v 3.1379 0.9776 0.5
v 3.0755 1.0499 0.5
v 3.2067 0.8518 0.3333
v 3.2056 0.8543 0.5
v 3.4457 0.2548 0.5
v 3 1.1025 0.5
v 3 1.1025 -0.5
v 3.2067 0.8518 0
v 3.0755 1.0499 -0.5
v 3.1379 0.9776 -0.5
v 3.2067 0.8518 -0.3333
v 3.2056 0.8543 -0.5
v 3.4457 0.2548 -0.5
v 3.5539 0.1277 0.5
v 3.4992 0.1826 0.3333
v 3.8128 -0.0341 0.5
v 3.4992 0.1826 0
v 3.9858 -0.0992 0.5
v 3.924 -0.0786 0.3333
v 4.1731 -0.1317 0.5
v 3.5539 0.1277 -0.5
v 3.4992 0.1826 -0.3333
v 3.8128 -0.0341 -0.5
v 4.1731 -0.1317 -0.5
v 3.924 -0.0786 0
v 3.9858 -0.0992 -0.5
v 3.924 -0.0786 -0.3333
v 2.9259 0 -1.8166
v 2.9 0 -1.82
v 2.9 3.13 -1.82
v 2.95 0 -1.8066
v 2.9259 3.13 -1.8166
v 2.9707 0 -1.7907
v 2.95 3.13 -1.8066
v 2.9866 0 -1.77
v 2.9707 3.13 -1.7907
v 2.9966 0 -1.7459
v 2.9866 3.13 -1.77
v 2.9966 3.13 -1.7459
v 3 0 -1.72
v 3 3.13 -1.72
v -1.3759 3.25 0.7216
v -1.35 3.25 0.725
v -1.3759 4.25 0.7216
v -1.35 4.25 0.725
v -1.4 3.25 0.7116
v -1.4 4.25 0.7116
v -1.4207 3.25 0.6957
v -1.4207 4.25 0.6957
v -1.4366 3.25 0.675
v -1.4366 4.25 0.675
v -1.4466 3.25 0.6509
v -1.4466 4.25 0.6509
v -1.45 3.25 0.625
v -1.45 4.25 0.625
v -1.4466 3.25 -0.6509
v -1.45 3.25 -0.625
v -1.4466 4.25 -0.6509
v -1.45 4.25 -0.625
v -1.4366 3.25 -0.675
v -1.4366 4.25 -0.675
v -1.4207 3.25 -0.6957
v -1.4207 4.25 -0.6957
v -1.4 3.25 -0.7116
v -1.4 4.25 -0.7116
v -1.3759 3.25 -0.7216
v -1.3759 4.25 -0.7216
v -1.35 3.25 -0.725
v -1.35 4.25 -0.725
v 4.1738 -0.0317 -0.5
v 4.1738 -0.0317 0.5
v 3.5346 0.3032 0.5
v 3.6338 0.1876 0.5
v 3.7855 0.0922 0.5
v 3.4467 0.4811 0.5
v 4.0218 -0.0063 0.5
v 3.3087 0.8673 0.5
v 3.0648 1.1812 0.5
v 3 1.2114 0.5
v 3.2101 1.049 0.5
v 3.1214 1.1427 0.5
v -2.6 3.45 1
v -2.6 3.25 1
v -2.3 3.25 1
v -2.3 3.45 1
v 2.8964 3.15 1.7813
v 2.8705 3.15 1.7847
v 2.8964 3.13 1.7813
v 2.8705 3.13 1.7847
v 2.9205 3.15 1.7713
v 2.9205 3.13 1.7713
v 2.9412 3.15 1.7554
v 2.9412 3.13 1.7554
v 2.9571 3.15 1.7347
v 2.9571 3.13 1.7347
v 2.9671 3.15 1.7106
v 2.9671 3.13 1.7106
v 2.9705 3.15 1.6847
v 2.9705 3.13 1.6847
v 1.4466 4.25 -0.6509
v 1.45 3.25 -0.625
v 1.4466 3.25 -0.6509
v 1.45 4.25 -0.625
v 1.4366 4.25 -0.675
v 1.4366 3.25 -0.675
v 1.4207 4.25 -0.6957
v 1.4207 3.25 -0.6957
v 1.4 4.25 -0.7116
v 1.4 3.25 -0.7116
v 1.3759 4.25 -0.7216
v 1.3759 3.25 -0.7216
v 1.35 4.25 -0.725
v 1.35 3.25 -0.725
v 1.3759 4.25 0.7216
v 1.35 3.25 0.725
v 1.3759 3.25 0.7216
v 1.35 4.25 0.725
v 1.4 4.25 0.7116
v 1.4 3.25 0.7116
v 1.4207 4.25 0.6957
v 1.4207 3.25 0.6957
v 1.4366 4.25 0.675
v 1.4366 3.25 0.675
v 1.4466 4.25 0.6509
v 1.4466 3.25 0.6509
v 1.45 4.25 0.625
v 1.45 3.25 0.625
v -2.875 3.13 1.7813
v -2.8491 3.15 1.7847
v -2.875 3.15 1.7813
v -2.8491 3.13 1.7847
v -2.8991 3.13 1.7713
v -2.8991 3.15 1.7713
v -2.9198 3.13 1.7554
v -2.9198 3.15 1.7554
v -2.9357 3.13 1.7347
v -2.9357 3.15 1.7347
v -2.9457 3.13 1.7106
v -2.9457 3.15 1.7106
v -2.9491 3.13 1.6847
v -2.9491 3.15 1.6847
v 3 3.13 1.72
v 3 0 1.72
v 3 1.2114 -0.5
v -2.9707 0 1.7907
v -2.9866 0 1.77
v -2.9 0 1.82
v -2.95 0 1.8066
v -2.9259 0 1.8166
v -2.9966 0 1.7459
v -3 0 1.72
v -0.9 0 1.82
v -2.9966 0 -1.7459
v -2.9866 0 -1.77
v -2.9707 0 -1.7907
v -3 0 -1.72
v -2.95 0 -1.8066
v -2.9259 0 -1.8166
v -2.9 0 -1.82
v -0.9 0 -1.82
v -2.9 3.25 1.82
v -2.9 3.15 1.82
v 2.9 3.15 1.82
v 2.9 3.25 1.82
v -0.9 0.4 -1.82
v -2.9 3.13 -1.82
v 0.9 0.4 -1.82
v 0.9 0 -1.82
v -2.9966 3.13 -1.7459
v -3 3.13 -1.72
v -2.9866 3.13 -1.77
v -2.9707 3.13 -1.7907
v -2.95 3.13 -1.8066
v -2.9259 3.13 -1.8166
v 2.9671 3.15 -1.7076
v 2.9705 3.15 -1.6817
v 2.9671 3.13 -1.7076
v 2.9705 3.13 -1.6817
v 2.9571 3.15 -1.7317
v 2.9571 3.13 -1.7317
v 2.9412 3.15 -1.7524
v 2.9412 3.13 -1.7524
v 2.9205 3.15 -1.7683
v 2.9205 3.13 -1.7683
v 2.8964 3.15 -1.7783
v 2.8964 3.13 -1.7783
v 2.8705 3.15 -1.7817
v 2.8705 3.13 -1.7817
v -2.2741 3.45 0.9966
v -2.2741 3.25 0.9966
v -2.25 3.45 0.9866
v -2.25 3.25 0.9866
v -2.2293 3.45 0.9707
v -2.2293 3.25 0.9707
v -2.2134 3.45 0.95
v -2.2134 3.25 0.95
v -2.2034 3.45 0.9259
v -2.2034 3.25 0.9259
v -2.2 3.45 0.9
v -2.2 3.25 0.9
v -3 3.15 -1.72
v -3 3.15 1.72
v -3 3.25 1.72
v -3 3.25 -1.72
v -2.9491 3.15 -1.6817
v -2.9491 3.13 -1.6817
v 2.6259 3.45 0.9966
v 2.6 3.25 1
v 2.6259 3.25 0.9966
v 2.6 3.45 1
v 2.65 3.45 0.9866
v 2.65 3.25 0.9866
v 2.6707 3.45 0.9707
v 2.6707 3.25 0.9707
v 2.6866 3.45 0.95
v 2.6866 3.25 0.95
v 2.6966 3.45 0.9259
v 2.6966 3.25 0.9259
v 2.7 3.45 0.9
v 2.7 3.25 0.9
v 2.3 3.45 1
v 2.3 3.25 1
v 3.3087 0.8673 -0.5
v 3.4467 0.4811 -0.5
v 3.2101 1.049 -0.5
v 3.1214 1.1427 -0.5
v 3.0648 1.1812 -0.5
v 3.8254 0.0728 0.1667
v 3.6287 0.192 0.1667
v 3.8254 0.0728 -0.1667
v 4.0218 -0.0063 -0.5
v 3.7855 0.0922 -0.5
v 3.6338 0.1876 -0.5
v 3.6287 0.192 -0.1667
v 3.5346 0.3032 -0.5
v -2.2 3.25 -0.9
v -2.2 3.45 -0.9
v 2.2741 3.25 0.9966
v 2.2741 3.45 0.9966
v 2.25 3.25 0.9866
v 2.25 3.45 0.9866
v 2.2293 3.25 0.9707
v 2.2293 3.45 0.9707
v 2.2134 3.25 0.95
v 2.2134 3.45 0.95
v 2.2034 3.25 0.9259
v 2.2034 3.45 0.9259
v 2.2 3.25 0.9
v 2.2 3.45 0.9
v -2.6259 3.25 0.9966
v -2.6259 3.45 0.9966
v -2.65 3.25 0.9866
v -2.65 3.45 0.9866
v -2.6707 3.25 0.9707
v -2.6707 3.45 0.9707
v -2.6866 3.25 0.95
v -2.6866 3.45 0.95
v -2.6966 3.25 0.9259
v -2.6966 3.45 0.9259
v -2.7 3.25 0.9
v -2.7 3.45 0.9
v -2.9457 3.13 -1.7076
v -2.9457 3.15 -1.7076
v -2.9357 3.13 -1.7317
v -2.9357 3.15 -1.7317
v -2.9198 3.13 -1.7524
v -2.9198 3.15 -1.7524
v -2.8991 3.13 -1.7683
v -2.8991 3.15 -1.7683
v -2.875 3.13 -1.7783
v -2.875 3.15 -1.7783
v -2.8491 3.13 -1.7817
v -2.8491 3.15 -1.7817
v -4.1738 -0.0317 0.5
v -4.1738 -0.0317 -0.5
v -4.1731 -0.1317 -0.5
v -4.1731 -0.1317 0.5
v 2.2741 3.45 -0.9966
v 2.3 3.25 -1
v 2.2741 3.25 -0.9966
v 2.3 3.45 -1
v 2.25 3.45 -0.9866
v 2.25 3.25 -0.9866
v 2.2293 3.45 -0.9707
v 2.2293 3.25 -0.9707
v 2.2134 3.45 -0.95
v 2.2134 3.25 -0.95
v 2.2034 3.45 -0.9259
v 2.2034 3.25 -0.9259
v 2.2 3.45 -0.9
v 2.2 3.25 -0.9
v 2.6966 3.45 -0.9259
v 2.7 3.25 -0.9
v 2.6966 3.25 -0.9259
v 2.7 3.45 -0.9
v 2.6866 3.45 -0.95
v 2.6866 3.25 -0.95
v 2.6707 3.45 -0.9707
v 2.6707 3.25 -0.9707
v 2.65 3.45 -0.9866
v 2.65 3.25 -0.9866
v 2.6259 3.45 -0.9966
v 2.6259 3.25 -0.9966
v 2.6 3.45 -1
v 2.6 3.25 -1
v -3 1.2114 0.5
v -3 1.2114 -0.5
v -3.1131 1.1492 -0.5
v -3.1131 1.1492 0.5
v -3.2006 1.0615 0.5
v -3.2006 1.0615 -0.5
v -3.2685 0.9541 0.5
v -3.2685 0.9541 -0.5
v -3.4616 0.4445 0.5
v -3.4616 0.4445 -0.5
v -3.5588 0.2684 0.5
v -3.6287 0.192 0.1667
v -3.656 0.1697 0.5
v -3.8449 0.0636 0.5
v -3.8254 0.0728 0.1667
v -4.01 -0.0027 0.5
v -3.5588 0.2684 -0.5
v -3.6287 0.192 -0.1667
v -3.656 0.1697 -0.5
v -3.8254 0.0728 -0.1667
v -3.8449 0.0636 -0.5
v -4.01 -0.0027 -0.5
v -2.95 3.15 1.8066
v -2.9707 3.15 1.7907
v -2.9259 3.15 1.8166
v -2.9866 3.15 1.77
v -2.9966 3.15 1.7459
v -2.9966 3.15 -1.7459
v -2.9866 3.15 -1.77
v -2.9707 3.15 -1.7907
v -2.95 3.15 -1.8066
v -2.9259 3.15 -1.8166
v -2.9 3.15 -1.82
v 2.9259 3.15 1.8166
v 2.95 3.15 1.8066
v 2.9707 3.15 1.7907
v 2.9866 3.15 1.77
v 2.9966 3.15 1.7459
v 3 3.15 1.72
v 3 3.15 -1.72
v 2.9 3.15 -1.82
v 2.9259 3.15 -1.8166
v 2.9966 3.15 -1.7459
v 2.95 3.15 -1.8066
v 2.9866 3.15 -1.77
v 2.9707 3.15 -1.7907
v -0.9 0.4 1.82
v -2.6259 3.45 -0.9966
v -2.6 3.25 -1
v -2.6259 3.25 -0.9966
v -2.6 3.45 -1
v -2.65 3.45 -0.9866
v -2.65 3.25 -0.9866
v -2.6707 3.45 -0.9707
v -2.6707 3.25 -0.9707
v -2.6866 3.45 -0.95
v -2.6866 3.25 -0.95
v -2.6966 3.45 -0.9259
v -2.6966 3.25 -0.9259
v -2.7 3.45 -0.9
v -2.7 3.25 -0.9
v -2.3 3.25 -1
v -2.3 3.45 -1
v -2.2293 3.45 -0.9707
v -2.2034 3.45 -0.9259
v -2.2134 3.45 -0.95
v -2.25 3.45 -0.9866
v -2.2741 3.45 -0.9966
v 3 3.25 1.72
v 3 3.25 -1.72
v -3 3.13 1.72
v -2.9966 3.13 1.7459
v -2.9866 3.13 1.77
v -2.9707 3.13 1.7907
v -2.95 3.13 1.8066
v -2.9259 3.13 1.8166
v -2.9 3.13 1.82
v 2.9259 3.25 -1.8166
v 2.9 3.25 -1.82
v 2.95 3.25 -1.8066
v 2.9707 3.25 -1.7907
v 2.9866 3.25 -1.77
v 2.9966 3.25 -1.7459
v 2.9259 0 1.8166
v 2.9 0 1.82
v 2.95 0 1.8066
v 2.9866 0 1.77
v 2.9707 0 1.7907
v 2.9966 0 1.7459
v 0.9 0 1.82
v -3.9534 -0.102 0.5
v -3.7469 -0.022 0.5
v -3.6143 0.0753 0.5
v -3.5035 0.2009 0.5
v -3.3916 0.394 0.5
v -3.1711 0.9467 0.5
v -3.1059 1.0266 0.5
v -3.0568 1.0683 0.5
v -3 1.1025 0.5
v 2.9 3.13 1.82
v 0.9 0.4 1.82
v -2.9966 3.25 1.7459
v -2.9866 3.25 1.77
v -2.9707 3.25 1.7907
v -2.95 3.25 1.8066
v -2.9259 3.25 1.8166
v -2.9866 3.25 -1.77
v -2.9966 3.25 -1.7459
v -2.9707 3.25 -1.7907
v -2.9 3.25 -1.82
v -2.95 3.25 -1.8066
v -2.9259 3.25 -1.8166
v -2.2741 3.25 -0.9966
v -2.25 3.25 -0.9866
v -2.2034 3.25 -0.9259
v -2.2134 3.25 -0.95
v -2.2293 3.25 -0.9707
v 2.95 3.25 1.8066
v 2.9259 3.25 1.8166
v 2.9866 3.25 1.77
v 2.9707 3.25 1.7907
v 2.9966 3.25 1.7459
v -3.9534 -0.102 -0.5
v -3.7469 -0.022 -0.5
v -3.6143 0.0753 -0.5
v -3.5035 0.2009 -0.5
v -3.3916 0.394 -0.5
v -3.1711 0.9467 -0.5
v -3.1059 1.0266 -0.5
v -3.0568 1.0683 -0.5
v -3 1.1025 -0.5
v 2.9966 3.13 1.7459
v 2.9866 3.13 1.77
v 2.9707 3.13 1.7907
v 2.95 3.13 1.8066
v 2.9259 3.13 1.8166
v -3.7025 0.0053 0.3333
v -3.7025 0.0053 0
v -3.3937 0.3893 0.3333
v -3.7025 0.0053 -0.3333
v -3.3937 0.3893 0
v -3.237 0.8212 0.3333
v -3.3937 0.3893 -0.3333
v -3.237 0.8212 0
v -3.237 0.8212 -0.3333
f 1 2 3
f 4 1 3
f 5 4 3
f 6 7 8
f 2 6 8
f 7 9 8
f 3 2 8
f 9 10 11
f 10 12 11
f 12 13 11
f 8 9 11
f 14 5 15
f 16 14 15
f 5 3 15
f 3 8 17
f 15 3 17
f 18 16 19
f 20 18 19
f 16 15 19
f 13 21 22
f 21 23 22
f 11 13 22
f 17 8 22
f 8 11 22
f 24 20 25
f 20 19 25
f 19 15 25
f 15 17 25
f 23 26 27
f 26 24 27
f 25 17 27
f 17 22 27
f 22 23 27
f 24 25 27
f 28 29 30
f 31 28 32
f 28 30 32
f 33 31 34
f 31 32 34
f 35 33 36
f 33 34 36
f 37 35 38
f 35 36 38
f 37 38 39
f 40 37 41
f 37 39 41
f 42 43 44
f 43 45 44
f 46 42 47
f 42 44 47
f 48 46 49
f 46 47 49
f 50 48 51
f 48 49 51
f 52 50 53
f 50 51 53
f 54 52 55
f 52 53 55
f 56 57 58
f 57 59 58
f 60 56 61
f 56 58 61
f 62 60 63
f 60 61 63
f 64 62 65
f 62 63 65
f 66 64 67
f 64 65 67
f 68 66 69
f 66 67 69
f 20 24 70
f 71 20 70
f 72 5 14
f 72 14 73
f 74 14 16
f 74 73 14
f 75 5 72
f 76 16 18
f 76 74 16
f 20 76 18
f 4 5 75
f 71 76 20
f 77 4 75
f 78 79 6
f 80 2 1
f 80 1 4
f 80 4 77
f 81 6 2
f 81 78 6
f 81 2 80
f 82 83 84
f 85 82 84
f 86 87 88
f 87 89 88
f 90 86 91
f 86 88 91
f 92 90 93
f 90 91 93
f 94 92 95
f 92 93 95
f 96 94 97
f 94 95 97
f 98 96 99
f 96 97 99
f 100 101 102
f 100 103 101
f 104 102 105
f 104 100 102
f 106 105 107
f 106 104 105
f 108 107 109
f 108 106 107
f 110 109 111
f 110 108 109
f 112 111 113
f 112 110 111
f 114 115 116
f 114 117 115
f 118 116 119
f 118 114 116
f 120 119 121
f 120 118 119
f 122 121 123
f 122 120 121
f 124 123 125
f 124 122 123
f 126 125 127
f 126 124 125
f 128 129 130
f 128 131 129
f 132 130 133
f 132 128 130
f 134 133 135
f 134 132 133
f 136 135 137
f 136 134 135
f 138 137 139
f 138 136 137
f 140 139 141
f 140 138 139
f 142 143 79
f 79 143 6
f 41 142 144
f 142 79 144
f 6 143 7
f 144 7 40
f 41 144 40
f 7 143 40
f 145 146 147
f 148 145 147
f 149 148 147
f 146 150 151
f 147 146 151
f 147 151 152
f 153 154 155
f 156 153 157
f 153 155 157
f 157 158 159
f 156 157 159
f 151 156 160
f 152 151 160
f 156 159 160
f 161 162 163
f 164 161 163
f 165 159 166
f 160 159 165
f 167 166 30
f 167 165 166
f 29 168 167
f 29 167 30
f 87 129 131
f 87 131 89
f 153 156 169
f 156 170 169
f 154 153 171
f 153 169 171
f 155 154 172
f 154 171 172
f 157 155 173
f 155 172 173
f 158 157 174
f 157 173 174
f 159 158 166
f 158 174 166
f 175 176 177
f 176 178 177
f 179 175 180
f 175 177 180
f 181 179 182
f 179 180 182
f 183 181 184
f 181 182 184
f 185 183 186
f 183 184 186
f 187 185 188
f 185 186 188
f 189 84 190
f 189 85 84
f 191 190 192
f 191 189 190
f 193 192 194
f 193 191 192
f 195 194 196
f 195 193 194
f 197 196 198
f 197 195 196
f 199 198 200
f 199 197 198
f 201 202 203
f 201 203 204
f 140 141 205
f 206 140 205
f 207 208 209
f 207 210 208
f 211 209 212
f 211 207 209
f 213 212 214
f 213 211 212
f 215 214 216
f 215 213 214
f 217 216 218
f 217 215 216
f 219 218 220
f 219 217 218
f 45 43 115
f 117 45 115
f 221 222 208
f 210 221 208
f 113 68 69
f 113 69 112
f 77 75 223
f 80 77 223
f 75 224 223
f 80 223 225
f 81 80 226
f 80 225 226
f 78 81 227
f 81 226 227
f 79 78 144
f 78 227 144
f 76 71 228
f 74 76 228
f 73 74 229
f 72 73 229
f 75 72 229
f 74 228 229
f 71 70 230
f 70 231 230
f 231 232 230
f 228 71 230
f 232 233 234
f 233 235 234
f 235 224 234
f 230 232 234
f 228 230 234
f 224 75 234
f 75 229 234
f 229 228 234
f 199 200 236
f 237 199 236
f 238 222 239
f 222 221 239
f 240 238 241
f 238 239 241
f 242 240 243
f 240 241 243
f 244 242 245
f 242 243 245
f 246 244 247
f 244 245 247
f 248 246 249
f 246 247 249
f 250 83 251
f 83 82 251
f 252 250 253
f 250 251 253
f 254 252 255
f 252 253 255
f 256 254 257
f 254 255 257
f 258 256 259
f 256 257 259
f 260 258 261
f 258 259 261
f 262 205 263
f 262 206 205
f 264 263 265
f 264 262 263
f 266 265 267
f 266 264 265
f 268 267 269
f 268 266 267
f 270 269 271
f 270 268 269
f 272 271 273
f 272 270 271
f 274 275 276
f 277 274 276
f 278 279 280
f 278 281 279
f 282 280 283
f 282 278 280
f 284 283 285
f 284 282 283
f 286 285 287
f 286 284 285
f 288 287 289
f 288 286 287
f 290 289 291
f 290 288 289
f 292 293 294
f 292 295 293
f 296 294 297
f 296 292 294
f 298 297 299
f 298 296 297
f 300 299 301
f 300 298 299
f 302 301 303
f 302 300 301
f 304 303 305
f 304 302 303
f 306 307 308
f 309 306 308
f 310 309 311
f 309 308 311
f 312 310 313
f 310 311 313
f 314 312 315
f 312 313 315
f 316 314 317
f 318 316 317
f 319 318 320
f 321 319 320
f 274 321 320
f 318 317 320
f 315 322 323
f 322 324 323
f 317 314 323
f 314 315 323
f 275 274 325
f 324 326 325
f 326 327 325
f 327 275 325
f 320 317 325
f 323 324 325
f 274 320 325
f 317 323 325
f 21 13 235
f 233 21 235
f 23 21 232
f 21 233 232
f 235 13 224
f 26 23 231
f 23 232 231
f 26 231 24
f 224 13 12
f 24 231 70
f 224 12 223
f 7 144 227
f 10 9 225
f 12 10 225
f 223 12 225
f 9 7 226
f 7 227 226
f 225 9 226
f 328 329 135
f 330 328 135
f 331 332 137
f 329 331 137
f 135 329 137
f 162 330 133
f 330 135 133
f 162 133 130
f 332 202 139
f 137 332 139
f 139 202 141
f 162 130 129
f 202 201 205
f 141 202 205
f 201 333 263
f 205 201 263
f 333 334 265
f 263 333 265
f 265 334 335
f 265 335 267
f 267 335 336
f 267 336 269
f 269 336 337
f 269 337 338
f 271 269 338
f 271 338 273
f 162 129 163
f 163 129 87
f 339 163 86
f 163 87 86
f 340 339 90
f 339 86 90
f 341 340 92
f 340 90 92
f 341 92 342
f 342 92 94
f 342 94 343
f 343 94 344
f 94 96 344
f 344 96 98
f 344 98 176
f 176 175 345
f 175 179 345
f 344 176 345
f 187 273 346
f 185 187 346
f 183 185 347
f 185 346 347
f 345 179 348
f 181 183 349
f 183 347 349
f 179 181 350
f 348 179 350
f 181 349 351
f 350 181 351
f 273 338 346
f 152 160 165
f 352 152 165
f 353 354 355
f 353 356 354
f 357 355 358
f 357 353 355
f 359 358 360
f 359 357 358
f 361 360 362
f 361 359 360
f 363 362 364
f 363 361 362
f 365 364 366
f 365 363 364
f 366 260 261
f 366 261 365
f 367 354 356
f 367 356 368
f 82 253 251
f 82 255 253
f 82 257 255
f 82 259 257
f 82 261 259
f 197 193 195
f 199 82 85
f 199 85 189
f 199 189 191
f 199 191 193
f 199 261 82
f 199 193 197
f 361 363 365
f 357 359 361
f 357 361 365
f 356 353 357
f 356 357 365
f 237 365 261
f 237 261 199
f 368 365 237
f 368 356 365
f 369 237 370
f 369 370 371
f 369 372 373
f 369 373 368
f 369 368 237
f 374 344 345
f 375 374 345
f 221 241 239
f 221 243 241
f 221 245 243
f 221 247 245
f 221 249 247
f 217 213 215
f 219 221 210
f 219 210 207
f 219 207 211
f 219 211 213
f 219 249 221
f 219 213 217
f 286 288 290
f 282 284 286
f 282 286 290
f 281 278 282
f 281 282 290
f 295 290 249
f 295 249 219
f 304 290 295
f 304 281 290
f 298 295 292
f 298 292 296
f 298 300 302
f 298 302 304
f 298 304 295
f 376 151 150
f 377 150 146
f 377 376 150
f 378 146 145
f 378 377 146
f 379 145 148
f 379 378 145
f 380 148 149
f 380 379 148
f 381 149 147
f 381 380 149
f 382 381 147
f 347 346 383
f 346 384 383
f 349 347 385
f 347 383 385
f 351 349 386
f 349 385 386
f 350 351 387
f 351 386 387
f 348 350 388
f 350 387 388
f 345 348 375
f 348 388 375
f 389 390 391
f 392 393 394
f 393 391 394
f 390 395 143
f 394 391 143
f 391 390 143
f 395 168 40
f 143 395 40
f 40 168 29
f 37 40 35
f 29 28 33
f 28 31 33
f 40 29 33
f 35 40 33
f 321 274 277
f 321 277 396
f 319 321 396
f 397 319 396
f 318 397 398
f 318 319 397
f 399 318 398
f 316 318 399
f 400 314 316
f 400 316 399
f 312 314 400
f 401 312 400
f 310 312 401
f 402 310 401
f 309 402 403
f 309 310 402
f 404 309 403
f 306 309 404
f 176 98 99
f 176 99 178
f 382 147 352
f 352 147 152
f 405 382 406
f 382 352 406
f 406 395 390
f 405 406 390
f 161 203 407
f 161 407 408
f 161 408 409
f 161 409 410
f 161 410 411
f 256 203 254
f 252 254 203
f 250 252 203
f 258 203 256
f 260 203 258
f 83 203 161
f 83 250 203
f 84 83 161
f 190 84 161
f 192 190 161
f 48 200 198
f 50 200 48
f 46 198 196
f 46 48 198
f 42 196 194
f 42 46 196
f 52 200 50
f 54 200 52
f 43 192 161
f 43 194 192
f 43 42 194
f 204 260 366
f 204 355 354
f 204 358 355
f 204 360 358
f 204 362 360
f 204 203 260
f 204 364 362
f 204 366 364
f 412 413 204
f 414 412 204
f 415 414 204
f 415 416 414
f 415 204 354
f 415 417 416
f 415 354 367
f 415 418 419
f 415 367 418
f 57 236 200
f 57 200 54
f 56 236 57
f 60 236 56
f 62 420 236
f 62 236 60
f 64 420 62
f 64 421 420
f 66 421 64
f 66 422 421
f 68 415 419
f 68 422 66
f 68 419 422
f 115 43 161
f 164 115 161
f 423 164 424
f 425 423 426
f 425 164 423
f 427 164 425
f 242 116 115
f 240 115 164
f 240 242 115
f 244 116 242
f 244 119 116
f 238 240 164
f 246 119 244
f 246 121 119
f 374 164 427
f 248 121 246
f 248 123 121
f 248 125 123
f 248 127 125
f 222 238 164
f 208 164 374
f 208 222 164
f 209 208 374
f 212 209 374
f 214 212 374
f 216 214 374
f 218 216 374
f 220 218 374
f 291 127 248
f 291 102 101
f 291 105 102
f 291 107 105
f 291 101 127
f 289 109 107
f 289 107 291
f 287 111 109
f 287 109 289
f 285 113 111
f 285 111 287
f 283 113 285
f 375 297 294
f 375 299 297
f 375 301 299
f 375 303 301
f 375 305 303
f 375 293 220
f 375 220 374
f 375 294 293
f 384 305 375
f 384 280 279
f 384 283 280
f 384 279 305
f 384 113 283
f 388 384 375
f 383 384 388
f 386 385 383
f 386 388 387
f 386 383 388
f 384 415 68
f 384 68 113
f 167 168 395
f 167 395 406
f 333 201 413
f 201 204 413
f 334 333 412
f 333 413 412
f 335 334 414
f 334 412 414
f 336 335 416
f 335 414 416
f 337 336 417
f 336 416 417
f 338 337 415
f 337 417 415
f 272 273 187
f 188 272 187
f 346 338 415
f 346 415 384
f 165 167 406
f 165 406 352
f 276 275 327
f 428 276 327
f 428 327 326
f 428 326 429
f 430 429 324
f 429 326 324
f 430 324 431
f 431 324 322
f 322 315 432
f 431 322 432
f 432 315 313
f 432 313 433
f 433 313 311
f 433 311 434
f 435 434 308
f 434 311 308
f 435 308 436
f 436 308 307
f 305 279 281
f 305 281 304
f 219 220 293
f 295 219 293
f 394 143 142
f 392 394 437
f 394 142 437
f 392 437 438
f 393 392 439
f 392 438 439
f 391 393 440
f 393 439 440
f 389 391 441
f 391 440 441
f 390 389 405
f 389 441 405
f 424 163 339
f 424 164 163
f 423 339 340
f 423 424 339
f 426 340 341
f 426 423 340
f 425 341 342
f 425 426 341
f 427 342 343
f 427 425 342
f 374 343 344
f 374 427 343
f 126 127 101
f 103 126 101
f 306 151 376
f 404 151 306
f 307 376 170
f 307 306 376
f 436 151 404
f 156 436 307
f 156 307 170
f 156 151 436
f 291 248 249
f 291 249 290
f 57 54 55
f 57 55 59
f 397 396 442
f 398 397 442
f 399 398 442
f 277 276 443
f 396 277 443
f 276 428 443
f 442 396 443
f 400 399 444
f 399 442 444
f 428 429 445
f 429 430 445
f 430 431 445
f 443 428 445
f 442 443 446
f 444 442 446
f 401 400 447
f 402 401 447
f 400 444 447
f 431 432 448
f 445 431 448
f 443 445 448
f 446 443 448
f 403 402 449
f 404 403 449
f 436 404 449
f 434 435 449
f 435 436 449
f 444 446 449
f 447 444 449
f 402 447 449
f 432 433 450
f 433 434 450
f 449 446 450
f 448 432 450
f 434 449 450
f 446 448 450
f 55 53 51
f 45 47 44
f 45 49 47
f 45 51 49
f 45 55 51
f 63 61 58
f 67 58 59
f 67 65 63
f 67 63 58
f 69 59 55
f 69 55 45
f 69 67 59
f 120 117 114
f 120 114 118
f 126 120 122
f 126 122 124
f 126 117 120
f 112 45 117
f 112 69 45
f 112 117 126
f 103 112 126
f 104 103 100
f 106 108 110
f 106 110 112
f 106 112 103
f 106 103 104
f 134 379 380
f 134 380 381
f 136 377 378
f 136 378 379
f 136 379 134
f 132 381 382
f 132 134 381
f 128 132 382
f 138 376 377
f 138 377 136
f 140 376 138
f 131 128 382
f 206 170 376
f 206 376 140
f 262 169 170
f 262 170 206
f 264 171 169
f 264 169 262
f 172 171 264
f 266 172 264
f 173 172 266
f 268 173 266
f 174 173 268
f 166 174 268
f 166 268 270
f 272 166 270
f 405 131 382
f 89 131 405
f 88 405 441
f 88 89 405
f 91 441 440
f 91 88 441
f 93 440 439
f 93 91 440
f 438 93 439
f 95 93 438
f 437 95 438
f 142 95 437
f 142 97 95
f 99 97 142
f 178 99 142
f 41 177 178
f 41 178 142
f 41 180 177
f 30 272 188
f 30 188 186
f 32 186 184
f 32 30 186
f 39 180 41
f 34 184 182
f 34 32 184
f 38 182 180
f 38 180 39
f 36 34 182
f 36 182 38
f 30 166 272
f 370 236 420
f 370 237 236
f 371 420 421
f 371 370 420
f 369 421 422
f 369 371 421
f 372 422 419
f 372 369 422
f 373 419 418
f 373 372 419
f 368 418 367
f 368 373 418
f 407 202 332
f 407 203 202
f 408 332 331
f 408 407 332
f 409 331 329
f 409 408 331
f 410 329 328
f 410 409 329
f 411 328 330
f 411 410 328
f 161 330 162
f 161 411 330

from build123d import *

# Parameters (mm, degrees)
SKETCH1_W           = 6
SKETCH1_H           = 3.64
BOSS_EXTRUDE1_DEPTH = 3.25
SKETCH2_W           = 2.9
SKETCH2_H           = 1.45
BOSS_EXTRUDE2_DEPTH = 1
SKETCH3_W           = 0.5
SKETCH3_H           = 2
BOSS_EXTRUDE3_DEPTH = 0.2
FILLET1_R           = 0.1
SKETCH4_W           = 6.273612193
SKETCH4_H           = 3.809222638
SKETCH4_W_2         = 5.919575883
SKETCH4_H_2         = 3.566405206
CUT_EXTRUDE1_DEPTH  = 0.02
FILLET2_R           = 0.1
SKETCH5_W           = 1.8
SKETCH5_H           = 0.4
CUT_EXTRUDE2_DEPTH  = 5.02
BOSS_EXTRUDE4_START = -0.5
BOSS_EXTRUDE4_DEPTH = 1


# Read off the part's stored shape, not the designer's step: Boss-Extrude4
with BuildPart() as part:
    # Sketch1 → Boss-Extrude1 (new body)
    with BuildSketch(Plane(origin=(0, 0, 0), x_dir=(1, 0, 0), z_dir=(0, 1, 0))):
        Rectangle(SKETCH1_W, SKETCH1_H)
    extrude(amount=BOSS_EXTRUDE1_DEPTH)

    # Sketch2 → Boss-Extrude2 (add)
    with BuildSketch(Plane(origin=(0, 3.25, 0), x_dir=(1, 0, 0), z_dir=(0, 1, 0))):
        Rectangle(SKETCH2_W, SKETCH2_H)
    extrude(amount=BOSS_EXTRUDE2_DEPTH)

    # Sketch3 → Boss-Extrude3 (add)
    with BuildSketch(Plane(origin=(0, 3.25, 0), x_dir=(1, 0, 0), z_dir=(0, 1, 0))):
        with Locations((-2.45, 0)):
            Rectangle(SKETCH3_W, SKETCH3_H)
        with Locations((2.45, 0)):
            Rectangle(SKETCH3_W, SKETCH3_H)
    extrude(amount=BOSS_EXTRUDE3_DEPTH)

    # Fillet1
    fillet1_edges = [part.edges().sort_by_distance(p)[0] for p in [
        (-1.45, 3.75, -0.725),
        (-1.45, 3.75, 0.725),
        (1.45, 3.75, 0.725),
        (1.45, 3.75, -0.725),
        (-2.7, 3.35, -1),
        (-2.7, 3.35, 1),
        (-2.2, 3.35, 1),
        (-2.2, 3.35, -1),
        (2.2, 3.35, -1),
        (2.2, 3.35, 1),
        (2.7, 3.35, 1),
        (2.7, 3.35, -1),
    ]]
    fillet(fillet1_edges, radius=FILLET1_R)

    # Sketch4 → Cut-Extrude1 (cut)
    with BuildSketch(Plane(origin=(0, 3.15, 0), x_dir=(1, 0, 0), z_dir=(0, 1, 0))):
        with Locations((-0.037546102, -0.013653128)):
            Rectangle(SKETCH4_W, SKETCH4_H)
        with Locations((0.010712352, -0.001469434)):
            Rectangle(SKETCH4_W_2, SKETCH4_H_2, mode=Mode.SUBTRACT)
    extrude(amount=-CUT_EXTRUDE1_DEPTH, mode=Mode.SUBTRACT)

    # Fillet2
    fillet2_edges = [part.edges().sort_by_distance(p)[0] for p in [
        (-3, 1.565, -1.82),
        (3, 1.565, -1.82),
        (3, 1.565, 1.82),
        (-3, 1.565, 1.82),
        (-2.94907559, 3.14, -1.781733169),
        (2.970500293, 3.14, -1.781733169),
        (2.970500293, 3.14, 1.784672037),
        (-2.94907559, 3.14, 1.784672037),
        (-3, 3.2, -1.82),
        (3, 3.2, -1.82),
        (3, 3.2, 1.82),
        (-3, 3.2, 1.82),
    ]]
    fillet(fillet2_edges, radius=FILLET2_R)

    # Sketch5 → Cut-Extrude2 (cut)
    with BuildSketch(Plane(origin=(0, 0, -1.82), x_dir=(-1, 0, 0), z_dir=(0, 0, -1))):
        with Locations((0, 0.2)):
            Rectangle(SKETCH5_W, SKETCH5_H)
    extrude(amount=-CUT_EXTRUDE2_DEPTH, mode=Mode.SUBTRACT)

    # Boss-Extrude4 outline → Boss-Extrude4 (add)
    with BuildSketch(Plane.XY.offset(BOSS_EXTRUDE4_START)):
        with BuildLine():
            Line((4.173146956, -0.131659711), (4.173759731, -0.031661589))
            add(Edge.make_bspline(
                [(4.173759731, -0.031661589), (4.060884449, -0.030969905), (3.862308969, 0.050205488), (3.325841553, 0.329858602), (3.401409137, 1.062439588), (3, 1.211404175)],
                knots=[0, 0, 0, 0, 0.203003015, 0.331433955, 1, 1, 1, 1], degree=3))
            Line((3, 1.211404175), (3, 1.102542921))
            add(Edge.make_bspline(
                [(3, 1.102542921), (3.09279535, 1.055379151), (3.226381881, 0.869010627), (3.326243834, 0.475899683), (3.482197094, 0.170683307), (3.700920866, 0.013413394), (3.917304218, -0.082452634), (4.088231211, -0.131134455), (4.173146956, -0.131659711)],
                knots=[0.026799616, 0.026799616, 0.026799616, 0.026799616, 0.25, 0.5, 0.625, 0.75, 0.875, 1, 1, 1, 1], degree=3))
        make_face()
        with BuildLine():
            Line((-3, 1.102542921), (-3, 1.211404175))
            add(Edge.make_bspline(
                [(-3, 1.211404175), (-3.401409137, 1.062439588), (-3.325841553, 0.329858602), (-3.862308969, 0.050205488), (-4.060884449, -0.030969905), (-4.173759731, -0.031661589)],
                knots=[0, 0, 0, 0, 0.668566045, 0.796996985, 1, 1, 1, 1], degree=3))
            Line((-4.173759731, -0.031661589), (-4.173146956, -0.131659711))
            add(Edge.make_bspline(
                [(-4.173146956, -0.131659711), (-4.009862358, -0.125892663), (-3.668802958, -0.046437584), (-3.359459873, 0.383160744), (-3.261093668, 0.825417205), (-3.129401541, 1.021566363), (-3.02801046, 1.087631493), (-3.010284263, 1.097420299), (-3, 1.102542921)],
                knots=[0, 0, 0, 0, 0.25, 0.5, 0.75, 0.960893979, 0.976536388, 1, 1, 1, 1], degree=3))
        make_face()
    extrude(amount=BOSS_EXTRUDE4_DEPTH)


solid = part.part
